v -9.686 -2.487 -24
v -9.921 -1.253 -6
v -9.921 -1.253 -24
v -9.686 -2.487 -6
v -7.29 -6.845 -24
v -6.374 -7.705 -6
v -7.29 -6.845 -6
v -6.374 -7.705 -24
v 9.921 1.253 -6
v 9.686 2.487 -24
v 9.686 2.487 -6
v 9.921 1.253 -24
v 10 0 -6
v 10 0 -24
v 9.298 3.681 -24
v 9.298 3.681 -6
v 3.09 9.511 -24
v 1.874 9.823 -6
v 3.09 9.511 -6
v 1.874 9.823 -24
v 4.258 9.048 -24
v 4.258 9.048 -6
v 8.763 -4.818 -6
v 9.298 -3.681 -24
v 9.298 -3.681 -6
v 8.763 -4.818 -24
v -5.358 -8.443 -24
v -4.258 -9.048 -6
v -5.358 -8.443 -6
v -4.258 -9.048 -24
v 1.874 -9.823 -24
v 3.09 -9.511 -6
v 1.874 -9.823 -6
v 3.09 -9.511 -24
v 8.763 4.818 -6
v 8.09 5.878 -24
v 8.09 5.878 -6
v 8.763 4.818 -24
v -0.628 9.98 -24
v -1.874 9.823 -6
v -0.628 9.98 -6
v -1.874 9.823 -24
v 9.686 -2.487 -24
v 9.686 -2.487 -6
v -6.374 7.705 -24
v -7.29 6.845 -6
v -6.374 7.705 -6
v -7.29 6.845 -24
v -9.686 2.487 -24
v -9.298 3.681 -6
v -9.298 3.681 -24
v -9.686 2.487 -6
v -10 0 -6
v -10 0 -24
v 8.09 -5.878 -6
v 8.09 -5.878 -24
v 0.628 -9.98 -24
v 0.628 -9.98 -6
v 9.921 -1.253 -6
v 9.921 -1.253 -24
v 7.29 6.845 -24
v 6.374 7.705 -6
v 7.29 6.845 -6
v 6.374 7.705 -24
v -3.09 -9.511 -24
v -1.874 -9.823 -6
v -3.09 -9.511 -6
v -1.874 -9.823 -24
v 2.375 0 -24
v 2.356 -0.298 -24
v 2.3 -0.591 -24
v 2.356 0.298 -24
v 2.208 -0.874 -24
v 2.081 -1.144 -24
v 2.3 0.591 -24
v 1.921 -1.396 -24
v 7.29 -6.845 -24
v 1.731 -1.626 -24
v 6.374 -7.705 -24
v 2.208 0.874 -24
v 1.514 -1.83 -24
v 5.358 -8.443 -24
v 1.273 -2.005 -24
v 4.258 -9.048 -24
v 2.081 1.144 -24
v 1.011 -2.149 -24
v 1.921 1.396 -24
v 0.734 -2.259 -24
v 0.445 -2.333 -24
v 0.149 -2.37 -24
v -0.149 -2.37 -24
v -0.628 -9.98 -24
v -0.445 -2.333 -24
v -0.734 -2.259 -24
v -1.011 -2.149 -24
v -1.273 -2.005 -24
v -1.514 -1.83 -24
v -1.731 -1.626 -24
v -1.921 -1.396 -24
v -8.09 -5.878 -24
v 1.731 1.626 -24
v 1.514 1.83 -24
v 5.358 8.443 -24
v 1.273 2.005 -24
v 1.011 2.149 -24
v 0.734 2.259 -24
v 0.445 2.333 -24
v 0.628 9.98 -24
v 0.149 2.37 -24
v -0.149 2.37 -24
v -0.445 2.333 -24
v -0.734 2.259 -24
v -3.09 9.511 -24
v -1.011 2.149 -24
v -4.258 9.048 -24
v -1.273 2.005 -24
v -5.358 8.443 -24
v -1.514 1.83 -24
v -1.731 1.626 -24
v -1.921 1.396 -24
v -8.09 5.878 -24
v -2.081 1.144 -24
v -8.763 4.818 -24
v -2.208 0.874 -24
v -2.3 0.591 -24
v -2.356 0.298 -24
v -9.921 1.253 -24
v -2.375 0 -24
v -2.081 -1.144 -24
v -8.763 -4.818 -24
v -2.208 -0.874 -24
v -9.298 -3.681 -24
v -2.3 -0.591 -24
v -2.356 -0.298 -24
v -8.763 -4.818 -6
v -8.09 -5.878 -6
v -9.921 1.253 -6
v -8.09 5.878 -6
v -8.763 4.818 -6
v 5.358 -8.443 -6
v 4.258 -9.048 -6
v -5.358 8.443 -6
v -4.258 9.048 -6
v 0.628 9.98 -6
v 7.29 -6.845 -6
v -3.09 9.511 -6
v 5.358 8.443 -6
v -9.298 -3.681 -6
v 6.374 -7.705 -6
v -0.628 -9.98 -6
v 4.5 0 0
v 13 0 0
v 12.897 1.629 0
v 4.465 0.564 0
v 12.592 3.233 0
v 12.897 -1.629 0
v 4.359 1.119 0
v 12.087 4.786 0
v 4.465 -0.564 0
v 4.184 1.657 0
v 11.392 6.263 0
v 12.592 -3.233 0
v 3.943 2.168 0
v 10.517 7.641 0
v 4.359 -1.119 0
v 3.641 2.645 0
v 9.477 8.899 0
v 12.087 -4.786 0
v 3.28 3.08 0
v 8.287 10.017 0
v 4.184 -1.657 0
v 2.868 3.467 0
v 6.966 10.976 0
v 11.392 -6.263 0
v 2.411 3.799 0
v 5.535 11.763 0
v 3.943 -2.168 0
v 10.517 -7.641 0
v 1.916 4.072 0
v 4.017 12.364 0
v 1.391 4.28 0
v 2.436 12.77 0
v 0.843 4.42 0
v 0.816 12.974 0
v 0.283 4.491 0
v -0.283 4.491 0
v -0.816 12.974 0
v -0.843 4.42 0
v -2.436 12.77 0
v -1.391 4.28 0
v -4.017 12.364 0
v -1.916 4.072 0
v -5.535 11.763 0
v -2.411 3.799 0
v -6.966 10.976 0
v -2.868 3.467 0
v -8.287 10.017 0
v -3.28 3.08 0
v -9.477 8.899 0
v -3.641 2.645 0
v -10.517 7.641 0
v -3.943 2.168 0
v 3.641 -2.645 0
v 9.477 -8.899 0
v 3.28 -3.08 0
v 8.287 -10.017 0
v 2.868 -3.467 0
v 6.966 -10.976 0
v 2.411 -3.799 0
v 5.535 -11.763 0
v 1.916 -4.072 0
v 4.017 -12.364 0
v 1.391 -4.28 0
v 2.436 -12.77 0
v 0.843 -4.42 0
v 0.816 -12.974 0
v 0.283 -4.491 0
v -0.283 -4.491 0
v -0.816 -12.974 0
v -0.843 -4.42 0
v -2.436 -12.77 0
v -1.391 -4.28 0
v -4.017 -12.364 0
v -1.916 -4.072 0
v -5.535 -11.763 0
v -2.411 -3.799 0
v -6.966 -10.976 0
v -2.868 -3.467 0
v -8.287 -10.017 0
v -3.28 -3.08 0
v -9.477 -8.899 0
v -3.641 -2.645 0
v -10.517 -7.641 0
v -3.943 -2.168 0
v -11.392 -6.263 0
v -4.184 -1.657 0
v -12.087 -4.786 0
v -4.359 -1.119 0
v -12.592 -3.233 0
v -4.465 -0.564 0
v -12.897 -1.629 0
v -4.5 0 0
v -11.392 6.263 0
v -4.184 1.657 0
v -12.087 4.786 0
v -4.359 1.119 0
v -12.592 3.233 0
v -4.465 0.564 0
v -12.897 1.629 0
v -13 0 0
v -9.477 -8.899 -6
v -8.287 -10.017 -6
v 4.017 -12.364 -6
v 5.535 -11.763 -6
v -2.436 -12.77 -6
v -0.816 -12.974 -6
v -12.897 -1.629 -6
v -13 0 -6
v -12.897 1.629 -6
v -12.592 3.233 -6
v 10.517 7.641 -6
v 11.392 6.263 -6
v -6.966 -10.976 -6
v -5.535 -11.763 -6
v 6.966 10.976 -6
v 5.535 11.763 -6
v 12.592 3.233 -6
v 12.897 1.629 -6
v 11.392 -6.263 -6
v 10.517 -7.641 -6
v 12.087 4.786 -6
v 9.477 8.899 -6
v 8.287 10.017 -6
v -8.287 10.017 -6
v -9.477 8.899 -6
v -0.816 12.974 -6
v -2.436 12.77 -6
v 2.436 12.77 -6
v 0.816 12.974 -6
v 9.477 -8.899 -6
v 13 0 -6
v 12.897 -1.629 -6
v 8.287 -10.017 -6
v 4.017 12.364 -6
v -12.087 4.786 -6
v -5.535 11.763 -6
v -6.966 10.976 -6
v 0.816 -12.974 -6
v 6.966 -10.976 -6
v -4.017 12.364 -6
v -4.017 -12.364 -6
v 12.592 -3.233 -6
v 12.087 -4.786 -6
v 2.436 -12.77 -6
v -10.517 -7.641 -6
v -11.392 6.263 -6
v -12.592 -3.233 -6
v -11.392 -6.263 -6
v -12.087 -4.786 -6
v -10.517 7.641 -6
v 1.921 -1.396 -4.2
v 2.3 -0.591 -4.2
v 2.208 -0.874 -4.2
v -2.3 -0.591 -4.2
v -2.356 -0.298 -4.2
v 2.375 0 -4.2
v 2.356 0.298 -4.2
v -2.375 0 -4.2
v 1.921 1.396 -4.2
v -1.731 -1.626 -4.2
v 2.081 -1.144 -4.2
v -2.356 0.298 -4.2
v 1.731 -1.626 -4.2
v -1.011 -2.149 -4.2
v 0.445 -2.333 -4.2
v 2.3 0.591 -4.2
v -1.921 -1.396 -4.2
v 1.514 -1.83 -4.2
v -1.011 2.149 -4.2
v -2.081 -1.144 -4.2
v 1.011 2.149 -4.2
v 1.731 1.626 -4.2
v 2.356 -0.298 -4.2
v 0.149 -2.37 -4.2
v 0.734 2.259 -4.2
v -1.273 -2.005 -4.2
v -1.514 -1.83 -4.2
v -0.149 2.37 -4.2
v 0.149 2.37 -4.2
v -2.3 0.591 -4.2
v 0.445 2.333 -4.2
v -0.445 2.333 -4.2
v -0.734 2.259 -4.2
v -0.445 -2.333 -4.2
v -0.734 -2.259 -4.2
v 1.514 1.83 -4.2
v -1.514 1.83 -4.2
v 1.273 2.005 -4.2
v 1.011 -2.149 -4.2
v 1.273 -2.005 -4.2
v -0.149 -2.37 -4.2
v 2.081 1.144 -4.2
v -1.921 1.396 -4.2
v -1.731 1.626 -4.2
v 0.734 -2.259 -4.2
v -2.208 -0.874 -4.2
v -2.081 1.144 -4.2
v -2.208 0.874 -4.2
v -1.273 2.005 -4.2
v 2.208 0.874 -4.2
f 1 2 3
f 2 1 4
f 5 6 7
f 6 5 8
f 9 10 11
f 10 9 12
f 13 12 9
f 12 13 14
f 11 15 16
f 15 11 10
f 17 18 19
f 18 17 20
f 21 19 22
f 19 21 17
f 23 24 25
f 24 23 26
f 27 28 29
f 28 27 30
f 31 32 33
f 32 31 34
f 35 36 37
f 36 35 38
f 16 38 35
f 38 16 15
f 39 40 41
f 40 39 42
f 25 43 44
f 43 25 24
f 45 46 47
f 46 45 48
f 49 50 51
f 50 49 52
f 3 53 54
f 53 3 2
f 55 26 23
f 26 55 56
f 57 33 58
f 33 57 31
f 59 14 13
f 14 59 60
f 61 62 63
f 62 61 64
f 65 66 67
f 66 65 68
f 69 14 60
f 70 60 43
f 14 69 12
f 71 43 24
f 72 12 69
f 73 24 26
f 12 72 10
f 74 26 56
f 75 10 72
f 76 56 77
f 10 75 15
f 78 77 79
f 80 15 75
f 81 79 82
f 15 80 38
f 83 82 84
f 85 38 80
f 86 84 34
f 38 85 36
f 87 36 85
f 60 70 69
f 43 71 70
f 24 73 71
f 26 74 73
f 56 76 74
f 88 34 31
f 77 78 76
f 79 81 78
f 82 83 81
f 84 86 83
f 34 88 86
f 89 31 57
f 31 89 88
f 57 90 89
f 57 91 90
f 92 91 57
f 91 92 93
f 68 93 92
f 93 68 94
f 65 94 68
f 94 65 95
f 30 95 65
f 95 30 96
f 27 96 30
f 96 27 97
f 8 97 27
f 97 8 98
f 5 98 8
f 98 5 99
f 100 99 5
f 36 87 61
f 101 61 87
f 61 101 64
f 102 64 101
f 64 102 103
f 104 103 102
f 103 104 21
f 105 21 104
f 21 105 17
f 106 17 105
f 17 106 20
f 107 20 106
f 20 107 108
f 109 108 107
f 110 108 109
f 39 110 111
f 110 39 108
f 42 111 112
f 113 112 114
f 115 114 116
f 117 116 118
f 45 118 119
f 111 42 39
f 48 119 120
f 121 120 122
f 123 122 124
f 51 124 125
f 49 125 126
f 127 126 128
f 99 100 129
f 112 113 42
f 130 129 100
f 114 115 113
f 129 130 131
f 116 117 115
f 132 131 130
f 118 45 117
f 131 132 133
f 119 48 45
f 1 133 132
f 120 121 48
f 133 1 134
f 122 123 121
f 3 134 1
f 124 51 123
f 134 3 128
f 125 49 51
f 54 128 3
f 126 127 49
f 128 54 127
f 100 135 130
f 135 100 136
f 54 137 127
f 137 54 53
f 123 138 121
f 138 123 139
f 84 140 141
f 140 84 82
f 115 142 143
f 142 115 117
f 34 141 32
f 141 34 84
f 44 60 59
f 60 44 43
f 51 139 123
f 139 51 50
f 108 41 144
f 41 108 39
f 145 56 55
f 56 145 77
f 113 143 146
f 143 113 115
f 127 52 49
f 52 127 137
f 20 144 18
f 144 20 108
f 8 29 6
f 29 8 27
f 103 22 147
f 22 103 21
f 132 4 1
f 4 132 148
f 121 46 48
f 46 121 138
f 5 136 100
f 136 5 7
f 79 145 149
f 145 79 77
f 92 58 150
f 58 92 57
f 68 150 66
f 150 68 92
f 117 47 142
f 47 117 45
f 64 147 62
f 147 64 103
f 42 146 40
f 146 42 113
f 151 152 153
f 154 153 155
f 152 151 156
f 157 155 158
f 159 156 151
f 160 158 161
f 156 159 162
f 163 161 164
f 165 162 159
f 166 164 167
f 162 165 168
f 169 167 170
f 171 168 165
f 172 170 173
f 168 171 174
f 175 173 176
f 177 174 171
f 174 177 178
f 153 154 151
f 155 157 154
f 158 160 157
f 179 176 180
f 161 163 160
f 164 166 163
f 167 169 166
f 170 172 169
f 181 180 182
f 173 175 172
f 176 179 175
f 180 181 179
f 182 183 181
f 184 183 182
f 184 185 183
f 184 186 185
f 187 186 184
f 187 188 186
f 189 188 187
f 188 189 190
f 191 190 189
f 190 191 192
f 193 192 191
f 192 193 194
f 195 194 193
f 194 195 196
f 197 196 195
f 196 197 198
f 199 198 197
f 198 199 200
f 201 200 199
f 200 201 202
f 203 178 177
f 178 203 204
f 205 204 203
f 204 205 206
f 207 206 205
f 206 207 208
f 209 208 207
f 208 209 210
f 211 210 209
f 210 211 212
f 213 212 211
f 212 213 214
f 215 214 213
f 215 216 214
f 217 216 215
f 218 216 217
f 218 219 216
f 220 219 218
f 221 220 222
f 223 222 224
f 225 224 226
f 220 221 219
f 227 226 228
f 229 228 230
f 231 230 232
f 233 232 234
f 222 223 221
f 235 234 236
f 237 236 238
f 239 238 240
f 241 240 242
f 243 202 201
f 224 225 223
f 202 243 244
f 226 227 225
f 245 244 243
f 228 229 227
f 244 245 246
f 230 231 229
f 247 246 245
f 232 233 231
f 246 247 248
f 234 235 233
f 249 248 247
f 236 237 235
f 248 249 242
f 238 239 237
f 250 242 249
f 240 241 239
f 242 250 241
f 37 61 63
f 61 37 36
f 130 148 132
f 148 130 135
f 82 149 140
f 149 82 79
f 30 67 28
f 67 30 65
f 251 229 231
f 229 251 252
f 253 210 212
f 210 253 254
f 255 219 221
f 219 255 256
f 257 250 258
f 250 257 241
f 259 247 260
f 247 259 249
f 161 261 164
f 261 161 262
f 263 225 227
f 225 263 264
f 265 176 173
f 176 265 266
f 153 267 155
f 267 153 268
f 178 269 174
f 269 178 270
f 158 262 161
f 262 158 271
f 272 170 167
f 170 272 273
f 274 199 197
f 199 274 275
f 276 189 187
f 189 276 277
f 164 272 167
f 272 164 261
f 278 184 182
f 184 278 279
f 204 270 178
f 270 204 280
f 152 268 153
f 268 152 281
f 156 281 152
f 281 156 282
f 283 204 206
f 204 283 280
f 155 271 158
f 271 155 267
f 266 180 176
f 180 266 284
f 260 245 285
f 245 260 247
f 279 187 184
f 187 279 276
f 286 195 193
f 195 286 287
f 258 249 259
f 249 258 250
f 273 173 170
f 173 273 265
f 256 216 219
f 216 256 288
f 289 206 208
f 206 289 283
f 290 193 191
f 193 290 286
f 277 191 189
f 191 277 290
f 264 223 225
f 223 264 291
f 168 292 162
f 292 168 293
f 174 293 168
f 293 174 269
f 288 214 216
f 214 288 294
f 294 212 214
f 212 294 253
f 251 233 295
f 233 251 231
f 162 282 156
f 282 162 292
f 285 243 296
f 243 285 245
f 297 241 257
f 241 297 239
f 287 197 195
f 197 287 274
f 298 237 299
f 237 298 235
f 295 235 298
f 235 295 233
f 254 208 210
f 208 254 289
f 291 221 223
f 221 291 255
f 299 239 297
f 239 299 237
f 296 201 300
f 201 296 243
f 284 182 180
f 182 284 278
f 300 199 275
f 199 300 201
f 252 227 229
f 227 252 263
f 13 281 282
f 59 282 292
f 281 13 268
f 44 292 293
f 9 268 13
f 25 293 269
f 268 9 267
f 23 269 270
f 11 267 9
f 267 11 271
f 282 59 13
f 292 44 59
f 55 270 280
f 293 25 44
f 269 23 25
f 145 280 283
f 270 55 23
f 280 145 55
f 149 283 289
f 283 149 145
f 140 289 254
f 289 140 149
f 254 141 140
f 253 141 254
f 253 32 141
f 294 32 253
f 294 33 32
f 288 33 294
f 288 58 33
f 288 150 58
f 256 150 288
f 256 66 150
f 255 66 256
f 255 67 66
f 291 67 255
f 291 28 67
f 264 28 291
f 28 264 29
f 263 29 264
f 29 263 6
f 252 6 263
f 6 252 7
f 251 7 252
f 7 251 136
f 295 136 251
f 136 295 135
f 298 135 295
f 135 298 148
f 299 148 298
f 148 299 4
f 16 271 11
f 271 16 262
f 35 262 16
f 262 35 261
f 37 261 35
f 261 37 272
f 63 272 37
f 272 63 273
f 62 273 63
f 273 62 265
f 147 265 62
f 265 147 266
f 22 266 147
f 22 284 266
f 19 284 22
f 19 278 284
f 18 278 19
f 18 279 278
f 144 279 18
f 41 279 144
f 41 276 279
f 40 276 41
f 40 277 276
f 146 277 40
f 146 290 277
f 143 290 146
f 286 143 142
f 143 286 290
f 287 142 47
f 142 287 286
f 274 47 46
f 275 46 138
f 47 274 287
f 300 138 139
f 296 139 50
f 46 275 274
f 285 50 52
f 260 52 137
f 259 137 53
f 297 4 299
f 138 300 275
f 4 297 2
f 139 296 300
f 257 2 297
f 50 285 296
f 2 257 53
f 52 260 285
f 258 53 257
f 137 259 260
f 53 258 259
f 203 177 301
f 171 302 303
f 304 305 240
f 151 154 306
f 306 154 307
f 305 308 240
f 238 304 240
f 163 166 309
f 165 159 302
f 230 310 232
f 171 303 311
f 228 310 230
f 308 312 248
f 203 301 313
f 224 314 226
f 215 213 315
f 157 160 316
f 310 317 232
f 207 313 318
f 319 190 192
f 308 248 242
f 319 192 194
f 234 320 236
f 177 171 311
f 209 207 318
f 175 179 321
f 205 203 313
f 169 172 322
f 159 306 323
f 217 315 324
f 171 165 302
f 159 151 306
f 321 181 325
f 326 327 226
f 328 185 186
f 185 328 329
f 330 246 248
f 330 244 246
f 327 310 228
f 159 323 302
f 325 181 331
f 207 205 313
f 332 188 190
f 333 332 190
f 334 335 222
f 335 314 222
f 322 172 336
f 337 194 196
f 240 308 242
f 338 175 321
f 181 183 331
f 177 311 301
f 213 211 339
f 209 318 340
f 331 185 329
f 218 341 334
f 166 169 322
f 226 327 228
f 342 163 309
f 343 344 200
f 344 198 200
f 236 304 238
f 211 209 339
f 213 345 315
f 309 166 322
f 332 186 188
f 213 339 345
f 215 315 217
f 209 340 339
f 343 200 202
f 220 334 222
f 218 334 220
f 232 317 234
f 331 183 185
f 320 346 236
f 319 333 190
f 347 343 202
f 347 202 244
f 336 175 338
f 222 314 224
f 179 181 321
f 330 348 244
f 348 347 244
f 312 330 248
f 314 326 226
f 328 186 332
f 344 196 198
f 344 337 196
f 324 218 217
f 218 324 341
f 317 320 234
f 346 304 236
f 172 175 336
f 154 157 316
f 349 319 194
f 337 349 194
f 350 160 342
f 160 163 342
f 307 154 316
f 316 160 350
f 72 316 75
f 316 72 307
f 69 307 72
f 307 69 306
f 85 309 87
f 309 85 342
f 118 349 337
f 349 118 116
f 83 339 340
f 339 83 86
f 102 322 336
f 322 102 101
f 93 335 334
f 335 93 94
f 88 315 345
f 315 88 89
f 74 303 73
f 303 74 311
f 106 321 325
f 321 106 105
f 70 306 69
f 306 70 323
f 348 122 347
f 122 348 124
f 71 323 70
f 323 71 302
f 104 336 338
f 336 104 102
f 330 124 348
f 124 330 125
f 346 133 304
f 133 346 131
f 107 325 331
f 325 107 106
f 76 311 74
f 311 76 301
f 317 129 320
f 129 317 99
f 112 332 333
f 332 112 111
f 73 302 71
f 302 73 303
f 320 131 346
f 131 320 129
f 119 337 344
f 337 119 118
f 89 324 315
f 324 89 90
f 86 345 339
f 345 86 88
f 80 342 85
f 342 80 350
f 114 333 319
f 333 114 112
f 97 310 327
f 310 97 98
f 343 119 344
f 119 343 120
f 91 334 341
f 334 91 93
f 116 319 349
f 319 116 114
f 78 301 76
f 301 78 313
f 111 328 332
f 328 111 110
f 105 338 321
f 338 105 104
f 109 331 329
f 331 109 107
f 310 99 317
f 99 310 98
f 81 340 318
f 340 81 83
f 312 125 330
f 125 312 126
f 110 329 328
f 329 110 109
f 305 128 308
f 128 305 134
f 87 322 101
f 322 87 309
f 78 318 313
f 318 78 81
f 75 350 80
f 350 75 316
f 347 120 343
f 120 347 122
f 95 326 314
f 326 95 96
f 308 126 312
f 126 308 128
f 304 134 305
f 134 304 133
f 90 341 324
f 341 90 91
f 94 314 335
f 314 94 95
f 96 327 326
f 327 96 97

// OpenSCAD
$fn = 50;


difference() {
	union() {
		translate(v = [0, 0, -24.0000000000]) {
			cylinder(h = 24, r = 10.0000000000);
		}
		translate(v = [0, 0, -6.0000000000]) {
			cylinder(h = 6, r = 13.0000000000);
		}
	}
	union() {
		translate(v = [0, 0, 0]) {
			rotate(a = [0, 0, 0]) {
				difference() {
					union() {
						#translate(v = [0, 0, -24.0000000000]) {
							cylinder(h = 24, r = 2.2500000000);
						}
						#translate(v = [0, 0, -4.2000000000]) {
							cylinder(h = 4.2000000000, r = 10.0000000000, r1 = 2.3750000000, r2 = 4.5000000000);
						}
						#translate(v = [0, 0, -24.0000000000]) {
							cylinder(h = 24, r = 2.3750000000);
						}
						#translate(v = [0, 0, -24.0000000000]) {
							cylinder(h = 24, r = 2.2500000000);
						}
					}
					union();
				}
			}
		}
	}
}
